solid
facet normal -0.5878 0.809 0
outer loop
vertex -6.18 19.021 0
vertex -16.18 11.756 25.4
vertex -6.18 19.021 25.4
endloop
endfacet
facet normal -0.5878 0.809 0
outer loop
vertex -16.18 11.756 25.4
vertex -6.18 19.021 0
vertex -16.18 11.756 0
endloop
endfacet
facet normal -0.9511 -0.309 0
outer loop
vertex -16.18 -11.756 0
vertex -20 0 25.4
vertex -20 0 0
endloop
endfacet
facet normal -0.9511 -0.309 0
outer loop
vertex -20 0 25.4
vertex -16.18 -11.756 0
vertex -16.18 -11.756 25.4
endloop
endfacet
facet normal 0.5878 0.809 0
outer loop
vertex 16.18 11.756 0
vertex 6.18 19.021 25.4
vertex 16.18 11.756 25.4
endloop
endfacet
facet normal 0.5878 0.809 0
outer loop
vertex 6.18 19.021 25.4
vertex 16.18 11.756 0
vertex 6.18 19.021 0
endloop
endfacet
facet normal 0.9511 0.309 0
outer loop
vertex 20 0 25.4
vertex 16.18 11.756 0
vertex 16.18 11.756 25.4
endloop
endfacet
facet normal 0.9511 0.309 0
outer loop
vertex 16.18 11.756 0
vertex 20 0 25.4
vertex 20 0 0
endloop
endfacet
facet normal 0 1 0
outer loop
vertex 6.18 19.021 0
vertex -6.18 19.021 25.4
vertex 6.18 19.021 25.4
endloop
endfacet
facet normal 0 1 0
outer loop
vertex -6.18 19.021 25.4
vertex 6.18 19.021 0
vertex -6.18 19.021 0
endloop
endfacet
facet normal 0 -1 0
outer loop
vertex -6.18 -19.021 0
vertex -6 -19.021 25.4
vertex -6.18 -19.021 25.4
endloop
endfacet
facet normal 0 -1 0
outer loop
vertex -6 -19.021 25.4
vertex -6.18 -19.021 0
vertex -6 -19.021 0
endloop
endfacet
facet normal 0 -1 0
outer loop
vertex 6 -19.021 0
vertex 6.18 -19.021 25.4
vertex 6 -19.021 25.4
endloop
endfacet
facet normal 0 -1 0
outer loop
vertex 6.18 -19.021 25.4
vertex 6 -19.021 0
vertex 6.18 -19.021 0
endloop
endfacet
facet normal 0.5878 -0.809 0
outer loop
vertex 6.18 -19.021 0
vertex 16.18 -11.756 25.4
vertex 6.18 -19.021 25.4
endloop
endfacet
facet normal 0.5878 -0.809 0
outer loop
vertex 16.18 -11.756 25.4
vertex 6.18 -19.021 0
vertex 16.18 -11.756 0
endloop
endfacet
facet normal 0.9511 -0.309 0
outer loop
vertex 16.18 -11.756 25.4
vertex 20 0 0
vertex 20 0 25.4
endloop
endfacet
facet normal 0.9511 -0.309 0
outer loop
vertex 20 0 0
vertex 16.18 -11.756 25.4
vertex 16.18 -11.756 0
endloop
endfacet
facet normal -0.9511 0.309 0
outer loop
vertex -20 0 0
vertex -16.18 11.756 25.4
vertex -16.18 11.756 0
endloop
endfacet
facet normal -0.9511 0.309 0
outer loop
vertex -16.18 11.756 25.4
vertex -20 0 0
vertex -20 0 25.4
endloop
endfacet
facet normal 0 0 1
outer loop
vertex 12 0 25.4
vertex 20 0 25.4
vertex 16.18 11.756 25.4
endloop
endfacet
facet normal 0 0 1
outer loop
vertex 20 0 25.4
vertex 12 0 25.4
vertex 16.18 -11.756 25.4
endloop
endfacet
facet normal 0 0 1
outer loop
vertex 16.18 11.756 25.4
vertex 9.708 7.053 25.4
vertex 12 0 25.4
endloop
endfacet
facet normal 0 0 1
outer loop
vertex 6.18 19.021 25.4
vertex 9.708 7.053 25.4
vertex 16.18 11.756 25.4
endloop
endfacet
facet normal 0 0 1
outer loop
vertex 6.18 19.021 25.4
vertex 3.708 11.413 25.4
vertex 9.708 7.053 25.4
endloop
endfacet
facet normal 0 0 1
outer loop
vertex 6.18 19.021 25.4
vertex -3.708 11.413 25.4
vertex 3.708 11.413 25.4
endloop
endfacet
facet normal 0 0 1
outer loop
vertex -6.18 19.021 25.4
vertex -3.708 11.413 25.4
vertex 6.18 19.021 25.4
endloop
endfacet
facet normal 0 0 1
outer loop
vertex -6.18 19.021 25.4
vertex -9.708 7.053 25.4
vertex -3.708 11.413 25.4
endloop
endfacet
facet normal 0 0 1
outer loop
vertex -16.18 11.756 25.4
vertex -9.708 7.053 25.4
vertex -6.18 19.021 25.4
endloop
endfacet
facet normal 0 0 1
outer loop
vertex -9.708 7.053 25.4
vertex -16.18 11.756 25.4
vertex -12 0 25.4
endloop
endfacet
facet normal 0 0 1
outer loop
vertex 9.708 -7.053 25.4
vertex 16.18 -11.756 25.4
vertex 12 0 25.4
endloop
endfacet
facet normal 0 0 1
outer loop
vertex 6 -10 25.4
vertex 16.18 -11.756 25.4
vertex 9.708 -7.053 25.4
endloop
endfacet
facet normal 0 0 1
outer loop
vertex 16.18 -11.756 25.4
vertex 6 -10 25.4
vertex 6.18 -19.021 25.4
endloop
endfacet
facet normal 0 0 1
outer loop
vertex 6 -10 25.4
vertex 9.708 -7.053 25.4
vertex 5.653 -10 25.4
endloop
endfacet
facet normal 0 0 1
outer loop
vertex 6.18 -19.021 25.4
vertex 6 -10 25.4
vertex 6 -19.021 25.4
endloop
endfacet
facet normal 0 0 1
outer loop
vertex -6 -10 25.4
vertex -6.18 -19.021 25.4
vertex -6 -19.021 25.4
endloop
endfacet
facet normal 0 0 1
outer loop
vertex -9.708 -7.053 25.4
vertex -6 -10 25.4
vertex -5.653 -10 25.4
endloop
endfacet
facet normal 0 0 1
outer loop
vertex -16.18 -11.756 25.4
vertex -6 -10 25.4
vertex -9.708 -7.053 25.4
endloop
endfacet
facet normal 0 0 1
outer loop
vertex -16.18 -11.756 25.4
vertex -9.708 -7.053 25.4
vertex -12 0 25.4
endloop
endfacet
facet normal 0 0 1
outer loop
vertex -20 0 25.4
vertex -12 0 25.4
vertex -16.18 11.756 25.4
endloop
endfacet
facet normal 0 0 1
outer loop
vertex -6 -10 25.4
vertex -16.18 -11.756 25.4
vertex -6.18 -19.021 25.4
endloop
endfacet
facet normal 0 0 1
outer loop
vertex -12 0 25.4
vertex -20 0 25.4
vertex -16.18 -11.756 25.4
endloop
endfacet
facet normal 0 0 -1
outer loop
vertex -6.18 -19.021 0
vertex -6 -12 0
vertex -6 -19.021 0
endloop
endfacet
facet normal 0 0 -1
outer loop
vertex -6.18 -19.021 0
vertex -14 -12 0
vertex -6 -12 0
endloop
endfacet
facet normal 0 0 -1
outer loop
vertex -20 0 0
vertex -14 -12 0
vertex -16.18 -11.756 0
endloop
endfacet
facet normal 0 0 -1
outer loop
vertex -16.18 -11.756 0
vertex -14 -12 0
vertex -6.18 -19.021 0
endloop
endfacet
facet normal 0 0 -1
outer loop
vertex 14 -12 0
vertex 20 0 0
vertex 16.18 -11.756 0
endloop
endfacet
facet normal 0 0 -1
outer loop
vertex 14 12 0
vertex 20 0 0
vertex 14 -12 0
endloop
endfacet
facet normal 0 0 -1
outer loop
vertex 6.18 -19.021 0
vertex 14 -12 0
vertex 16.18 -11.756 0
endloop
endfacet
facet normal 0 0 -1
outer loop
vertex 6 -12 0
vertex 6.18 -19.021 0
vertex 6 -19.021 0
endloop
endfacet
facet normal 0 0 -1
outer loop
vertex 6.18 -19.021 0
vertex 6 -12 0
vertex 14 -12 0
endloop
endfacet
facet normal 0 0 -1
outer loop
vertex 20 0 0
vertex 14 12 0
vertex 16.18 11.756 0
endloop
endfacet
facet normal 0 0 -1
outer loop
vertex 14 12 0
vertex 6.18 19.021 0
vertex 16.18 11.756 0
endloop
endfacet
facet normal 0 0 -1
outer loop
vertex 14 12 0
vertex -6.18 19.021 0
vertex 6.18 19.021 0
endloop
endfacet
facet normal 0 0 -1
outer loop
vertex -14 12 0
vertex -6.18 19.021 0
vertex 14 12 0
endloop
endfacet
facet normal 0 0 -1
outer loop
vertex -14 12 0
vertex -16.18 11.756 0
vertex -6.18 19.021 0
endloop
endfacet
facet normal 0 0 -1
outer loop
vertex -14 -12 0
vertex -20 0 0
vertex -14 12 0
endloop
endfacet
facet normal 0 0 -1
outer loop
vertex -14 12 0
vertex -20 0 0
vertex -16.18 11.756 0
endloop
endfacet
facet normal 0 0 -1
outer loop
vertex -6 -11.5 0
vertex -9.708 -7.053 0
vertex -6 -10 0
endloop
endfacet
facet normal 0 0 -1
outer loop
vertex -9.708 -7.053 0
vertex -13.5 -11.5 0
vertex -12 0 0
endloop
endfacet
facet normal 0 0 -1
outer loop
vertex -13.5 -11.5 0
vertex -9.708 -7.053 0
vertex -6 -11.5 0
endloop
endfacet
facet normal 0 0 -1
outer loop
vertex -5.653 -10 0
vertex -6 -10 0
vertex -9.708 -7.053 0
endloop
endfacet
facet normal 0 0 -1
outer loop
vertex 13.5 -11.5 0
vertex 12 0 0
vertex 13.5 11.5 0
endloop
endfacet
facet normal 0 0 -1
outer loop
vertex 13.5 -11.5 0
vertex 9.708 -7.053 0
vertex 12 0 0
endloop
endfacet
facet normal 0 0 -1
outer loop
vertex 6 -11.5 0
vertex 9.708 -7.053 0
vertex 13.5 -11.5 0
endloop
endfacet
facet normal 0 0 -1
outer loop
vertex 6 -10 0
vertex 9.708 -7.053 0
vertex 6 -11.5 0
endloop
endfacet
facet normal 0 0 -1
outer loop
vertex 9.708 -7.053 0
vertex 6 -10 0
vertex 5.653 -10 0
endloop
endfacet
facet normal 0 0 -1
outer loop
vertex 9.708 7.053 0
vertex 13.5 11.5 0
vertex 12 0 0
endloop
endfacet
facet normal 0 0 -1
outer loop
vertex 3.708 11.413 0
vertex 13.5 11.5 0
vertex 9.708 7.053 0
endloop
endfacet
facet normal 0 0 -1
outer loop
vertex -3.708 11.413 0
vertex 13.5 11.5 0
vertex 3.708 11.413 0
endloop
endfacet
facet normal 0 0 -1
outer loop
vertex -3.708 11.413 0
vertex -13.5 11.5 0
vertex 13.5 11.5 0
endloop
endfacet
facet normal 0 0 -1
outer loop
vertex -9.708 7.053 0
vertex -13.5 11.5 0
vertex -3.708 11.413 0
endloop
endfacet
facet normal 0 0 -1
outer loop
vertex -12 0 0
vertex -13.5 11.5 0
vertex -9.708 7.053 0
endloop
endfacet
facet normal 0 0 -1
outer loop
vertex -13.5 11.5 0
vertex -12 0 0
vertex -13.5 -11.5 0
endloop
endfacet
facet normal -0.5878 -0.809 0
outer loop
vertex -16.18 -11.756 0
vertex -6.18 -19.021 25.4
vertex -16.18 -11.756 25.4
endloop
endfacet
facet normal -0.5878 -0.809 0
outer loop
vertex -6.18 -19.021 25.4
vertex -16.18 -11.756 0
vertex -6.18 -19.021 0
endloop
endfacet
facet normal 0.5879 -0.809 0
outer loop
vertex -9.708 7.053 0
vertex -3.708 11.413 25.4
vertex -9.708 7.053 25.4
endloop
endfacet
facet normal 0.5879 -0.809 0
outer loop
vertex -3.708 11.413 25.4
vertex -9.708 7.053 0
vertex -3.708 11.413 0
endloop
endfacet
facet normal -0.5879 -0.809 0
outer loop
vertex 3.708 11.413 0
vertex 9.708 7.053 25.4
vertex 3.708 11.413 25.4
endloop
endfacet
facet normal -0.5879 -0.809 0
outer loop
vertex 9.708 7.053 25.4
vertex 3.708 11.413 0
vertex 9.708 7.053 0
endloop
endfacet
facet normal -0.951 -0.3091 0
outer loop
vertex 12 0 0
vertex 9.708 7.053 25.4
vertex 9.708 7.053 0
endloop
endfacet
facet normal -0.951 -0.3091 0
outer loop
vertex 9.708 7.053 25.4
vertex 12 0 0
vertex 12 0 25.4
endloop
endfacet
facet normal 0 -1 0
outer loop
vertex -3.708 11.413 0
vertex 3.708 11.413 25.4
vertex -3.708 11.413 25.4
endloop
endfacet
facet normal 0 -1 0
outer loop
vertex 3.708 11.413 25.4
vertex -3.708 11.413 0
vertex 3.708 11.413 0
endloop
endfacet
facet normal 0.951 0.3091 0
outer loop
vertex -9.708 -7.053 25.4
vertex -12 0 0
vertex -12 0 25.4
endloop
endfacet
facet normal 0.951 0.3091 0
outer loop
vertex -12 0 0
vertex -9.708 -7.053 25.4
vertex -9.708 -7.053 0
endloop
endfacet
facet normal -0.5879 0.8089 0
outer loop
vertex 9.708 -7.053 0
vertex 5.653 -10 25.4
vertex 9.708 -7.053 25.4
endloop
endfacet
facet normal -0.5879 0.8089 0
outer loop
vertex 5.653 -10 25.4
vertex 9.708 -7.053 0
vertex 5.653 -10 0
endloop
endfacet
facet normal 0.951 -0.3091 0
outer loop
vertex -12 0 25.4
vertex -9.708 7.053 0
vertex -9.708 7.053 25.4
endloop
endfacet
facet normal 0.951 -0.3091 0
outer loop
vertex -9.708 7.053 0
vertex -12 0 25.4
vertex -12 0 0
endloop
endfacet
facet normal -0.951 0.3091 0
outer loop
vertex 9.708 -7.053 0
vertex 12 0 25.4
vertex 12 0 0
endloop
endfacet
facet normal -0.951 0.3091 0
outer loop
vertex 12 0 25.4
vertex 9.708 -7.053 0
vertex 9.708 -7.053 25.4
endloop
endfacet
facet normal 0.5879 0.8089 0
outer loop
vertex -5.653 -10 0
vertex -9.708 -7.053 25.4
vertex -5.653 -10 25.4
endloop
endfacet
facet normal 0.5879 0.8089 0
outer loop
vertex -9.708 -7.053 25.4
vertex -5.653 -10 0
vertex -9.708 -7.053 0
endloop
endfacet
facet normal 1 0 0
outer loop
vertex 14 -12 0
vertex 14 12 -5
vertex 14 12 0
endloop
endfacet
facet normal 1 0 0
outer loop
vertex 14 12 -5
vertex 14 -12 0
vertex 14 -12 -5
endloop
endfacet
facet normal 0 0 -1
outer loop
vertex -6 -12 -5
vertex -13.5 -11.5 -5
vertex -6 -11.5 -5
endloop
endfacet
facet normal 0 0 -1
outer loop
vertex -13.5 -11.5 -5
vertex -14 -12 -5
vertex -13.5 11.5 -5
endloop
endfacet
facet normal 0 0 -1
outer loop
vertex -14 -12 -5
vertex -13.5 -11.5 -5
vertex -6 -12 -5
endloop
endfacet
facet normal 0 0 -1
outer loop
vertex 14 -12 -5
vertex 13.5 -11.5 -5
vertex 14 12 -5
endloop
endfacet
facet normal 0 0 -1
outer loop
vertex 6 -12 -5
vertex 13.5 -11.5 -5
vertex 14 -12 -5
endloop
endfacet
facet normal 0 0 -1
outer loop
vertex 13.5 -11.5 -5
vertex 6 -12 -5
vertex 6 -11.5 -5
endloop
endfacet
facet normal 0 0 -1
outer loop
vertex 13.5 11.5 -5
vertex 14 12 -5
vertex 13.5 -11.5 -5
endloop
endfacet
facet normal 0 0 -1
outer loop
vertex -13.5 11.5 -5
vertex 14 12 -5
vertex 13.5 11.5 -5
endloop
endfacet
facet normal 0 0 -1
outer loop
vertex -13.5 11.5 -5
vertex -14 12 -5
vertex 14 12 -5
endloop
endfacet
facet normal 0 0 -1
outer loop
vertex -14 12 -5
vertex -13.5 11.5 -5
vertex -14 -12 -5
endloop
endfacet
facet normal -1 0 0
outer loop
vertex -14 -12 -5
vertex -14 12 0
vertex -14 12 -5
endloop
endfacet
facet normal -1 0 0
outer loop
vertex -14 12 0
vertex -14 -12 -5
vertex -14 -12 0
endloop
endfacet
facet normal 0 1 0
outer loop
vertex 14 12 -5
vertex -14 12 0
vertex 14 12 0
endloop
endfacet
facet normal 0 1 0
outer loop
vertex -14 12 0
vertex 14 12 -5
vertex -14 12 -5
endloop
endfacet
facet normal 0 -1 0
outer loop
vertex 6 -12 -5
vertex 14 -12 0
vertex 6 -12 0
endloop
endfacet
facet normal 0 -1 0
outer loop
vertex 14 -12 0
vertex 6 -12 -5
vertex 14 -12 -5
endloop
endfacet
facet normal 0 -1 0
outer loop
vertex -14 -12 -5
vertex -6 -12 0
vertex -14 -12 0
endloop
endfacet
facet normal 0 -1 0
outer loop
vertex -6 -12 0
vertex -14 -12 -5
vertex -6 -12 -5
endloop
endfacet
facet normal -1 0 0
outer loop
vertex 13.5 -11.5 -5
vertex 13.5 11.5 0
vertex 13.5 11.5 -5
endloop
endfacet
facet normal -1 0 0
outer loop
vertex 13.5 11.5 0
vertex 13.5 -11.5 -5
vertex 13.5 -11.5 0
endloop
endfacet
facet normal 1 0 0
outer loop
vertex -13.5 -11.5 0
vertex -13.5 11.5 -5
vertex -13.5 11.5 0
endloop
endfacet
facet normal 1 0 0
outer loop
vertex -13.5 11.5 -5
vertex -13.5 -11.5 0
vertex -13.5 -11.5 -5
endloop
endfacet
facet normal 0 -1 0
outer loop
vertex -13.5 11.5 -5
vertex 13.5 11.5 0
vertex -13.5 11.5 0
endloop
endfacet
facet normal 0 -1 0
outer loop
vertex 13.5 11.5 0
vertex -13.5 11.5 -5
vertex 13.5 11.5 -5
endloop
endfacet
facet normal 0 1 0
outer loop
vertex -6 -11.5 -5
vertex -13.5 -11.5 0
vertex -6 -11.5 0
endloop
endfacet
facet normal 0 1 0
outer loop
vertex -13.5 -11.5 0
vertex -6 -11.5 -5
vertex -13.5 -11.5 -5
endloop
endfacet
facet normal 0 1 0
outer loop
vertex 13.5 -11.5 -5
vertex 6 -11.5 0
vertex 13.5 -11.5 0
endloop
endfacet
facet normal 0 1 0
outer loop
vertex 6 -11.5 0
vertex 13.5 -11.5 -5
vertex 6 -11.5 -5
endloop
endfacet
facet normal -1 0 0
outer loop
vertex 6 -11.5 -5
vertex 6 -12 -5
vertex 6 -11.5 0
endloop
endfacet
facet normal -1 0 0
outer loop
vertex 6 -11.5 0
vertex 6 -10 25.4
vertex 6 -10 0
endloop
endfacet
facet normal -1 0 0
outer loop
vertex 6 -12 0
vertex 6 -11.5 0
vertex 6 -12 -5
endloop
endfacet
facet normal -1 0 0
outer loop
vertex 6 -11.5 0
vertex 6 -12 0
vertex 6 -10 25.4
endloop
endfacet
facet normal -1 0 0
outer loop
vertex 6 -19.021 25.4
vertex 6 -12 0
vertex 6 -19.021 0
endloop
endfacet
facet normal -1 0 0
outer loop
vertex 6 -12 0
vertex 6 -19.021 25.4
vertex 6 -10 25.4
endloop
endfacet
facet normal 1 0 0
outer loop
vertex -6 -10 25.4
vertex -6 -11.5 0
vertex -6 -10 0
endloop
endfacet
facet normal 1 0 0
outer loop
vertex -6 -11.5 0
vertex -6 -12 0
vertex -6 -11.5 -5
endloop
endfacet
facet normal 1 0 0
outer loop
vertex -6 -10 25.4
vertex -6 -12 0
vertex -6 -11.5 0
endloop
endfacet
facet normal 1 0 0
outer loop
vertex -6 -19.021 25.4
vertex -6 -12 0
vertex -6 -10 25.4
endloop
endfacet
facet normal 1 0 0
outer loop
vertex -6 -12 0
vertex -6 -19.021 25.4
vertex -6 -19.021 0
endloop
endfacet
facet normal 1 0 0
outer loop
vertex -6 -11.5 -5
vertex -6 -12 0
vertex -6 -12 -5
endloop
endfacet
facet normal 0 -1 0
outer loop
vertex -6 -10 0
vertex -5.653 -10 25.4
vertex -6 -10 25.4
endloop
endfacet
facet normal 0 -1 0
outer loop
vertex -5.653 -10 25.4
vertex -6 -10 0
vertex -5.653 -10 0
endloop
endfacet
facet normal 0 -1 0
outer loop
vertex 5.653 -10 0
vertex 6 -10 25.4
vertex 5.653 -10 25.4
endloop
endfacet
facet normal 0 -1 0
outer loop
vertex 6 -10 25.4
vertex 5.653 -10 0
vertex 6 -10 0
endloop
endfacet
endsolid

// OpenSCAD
cup_dia = 40; 
tool_height = 25.4; 
cup_gap_w = 30;


$fn=10;

difference()

{union(){

    difference()
    {cylinder(tool_height,r = cup_dia/2);
        translate([0,0,-0.05]) cylinder(tool_height+.1,r = cup_dia/2-8);
        
        }
        
    //flange for bottom
        
    difference()
        {translate([0,0,0]) color("blue") cube([cup_gap_w-2,cup_gap_w-6,cup_gap_w-20],center=true);
            
        translate([0,0,0]) color("blue") cube([cup_gap_w-3,cup_gap_w-7,cup_gap_w],center=true);}
    }
        
        
    
   translate([-06,-22,-09])
    color("green") 
    cube([12,12,tool_height+10]);}
   
